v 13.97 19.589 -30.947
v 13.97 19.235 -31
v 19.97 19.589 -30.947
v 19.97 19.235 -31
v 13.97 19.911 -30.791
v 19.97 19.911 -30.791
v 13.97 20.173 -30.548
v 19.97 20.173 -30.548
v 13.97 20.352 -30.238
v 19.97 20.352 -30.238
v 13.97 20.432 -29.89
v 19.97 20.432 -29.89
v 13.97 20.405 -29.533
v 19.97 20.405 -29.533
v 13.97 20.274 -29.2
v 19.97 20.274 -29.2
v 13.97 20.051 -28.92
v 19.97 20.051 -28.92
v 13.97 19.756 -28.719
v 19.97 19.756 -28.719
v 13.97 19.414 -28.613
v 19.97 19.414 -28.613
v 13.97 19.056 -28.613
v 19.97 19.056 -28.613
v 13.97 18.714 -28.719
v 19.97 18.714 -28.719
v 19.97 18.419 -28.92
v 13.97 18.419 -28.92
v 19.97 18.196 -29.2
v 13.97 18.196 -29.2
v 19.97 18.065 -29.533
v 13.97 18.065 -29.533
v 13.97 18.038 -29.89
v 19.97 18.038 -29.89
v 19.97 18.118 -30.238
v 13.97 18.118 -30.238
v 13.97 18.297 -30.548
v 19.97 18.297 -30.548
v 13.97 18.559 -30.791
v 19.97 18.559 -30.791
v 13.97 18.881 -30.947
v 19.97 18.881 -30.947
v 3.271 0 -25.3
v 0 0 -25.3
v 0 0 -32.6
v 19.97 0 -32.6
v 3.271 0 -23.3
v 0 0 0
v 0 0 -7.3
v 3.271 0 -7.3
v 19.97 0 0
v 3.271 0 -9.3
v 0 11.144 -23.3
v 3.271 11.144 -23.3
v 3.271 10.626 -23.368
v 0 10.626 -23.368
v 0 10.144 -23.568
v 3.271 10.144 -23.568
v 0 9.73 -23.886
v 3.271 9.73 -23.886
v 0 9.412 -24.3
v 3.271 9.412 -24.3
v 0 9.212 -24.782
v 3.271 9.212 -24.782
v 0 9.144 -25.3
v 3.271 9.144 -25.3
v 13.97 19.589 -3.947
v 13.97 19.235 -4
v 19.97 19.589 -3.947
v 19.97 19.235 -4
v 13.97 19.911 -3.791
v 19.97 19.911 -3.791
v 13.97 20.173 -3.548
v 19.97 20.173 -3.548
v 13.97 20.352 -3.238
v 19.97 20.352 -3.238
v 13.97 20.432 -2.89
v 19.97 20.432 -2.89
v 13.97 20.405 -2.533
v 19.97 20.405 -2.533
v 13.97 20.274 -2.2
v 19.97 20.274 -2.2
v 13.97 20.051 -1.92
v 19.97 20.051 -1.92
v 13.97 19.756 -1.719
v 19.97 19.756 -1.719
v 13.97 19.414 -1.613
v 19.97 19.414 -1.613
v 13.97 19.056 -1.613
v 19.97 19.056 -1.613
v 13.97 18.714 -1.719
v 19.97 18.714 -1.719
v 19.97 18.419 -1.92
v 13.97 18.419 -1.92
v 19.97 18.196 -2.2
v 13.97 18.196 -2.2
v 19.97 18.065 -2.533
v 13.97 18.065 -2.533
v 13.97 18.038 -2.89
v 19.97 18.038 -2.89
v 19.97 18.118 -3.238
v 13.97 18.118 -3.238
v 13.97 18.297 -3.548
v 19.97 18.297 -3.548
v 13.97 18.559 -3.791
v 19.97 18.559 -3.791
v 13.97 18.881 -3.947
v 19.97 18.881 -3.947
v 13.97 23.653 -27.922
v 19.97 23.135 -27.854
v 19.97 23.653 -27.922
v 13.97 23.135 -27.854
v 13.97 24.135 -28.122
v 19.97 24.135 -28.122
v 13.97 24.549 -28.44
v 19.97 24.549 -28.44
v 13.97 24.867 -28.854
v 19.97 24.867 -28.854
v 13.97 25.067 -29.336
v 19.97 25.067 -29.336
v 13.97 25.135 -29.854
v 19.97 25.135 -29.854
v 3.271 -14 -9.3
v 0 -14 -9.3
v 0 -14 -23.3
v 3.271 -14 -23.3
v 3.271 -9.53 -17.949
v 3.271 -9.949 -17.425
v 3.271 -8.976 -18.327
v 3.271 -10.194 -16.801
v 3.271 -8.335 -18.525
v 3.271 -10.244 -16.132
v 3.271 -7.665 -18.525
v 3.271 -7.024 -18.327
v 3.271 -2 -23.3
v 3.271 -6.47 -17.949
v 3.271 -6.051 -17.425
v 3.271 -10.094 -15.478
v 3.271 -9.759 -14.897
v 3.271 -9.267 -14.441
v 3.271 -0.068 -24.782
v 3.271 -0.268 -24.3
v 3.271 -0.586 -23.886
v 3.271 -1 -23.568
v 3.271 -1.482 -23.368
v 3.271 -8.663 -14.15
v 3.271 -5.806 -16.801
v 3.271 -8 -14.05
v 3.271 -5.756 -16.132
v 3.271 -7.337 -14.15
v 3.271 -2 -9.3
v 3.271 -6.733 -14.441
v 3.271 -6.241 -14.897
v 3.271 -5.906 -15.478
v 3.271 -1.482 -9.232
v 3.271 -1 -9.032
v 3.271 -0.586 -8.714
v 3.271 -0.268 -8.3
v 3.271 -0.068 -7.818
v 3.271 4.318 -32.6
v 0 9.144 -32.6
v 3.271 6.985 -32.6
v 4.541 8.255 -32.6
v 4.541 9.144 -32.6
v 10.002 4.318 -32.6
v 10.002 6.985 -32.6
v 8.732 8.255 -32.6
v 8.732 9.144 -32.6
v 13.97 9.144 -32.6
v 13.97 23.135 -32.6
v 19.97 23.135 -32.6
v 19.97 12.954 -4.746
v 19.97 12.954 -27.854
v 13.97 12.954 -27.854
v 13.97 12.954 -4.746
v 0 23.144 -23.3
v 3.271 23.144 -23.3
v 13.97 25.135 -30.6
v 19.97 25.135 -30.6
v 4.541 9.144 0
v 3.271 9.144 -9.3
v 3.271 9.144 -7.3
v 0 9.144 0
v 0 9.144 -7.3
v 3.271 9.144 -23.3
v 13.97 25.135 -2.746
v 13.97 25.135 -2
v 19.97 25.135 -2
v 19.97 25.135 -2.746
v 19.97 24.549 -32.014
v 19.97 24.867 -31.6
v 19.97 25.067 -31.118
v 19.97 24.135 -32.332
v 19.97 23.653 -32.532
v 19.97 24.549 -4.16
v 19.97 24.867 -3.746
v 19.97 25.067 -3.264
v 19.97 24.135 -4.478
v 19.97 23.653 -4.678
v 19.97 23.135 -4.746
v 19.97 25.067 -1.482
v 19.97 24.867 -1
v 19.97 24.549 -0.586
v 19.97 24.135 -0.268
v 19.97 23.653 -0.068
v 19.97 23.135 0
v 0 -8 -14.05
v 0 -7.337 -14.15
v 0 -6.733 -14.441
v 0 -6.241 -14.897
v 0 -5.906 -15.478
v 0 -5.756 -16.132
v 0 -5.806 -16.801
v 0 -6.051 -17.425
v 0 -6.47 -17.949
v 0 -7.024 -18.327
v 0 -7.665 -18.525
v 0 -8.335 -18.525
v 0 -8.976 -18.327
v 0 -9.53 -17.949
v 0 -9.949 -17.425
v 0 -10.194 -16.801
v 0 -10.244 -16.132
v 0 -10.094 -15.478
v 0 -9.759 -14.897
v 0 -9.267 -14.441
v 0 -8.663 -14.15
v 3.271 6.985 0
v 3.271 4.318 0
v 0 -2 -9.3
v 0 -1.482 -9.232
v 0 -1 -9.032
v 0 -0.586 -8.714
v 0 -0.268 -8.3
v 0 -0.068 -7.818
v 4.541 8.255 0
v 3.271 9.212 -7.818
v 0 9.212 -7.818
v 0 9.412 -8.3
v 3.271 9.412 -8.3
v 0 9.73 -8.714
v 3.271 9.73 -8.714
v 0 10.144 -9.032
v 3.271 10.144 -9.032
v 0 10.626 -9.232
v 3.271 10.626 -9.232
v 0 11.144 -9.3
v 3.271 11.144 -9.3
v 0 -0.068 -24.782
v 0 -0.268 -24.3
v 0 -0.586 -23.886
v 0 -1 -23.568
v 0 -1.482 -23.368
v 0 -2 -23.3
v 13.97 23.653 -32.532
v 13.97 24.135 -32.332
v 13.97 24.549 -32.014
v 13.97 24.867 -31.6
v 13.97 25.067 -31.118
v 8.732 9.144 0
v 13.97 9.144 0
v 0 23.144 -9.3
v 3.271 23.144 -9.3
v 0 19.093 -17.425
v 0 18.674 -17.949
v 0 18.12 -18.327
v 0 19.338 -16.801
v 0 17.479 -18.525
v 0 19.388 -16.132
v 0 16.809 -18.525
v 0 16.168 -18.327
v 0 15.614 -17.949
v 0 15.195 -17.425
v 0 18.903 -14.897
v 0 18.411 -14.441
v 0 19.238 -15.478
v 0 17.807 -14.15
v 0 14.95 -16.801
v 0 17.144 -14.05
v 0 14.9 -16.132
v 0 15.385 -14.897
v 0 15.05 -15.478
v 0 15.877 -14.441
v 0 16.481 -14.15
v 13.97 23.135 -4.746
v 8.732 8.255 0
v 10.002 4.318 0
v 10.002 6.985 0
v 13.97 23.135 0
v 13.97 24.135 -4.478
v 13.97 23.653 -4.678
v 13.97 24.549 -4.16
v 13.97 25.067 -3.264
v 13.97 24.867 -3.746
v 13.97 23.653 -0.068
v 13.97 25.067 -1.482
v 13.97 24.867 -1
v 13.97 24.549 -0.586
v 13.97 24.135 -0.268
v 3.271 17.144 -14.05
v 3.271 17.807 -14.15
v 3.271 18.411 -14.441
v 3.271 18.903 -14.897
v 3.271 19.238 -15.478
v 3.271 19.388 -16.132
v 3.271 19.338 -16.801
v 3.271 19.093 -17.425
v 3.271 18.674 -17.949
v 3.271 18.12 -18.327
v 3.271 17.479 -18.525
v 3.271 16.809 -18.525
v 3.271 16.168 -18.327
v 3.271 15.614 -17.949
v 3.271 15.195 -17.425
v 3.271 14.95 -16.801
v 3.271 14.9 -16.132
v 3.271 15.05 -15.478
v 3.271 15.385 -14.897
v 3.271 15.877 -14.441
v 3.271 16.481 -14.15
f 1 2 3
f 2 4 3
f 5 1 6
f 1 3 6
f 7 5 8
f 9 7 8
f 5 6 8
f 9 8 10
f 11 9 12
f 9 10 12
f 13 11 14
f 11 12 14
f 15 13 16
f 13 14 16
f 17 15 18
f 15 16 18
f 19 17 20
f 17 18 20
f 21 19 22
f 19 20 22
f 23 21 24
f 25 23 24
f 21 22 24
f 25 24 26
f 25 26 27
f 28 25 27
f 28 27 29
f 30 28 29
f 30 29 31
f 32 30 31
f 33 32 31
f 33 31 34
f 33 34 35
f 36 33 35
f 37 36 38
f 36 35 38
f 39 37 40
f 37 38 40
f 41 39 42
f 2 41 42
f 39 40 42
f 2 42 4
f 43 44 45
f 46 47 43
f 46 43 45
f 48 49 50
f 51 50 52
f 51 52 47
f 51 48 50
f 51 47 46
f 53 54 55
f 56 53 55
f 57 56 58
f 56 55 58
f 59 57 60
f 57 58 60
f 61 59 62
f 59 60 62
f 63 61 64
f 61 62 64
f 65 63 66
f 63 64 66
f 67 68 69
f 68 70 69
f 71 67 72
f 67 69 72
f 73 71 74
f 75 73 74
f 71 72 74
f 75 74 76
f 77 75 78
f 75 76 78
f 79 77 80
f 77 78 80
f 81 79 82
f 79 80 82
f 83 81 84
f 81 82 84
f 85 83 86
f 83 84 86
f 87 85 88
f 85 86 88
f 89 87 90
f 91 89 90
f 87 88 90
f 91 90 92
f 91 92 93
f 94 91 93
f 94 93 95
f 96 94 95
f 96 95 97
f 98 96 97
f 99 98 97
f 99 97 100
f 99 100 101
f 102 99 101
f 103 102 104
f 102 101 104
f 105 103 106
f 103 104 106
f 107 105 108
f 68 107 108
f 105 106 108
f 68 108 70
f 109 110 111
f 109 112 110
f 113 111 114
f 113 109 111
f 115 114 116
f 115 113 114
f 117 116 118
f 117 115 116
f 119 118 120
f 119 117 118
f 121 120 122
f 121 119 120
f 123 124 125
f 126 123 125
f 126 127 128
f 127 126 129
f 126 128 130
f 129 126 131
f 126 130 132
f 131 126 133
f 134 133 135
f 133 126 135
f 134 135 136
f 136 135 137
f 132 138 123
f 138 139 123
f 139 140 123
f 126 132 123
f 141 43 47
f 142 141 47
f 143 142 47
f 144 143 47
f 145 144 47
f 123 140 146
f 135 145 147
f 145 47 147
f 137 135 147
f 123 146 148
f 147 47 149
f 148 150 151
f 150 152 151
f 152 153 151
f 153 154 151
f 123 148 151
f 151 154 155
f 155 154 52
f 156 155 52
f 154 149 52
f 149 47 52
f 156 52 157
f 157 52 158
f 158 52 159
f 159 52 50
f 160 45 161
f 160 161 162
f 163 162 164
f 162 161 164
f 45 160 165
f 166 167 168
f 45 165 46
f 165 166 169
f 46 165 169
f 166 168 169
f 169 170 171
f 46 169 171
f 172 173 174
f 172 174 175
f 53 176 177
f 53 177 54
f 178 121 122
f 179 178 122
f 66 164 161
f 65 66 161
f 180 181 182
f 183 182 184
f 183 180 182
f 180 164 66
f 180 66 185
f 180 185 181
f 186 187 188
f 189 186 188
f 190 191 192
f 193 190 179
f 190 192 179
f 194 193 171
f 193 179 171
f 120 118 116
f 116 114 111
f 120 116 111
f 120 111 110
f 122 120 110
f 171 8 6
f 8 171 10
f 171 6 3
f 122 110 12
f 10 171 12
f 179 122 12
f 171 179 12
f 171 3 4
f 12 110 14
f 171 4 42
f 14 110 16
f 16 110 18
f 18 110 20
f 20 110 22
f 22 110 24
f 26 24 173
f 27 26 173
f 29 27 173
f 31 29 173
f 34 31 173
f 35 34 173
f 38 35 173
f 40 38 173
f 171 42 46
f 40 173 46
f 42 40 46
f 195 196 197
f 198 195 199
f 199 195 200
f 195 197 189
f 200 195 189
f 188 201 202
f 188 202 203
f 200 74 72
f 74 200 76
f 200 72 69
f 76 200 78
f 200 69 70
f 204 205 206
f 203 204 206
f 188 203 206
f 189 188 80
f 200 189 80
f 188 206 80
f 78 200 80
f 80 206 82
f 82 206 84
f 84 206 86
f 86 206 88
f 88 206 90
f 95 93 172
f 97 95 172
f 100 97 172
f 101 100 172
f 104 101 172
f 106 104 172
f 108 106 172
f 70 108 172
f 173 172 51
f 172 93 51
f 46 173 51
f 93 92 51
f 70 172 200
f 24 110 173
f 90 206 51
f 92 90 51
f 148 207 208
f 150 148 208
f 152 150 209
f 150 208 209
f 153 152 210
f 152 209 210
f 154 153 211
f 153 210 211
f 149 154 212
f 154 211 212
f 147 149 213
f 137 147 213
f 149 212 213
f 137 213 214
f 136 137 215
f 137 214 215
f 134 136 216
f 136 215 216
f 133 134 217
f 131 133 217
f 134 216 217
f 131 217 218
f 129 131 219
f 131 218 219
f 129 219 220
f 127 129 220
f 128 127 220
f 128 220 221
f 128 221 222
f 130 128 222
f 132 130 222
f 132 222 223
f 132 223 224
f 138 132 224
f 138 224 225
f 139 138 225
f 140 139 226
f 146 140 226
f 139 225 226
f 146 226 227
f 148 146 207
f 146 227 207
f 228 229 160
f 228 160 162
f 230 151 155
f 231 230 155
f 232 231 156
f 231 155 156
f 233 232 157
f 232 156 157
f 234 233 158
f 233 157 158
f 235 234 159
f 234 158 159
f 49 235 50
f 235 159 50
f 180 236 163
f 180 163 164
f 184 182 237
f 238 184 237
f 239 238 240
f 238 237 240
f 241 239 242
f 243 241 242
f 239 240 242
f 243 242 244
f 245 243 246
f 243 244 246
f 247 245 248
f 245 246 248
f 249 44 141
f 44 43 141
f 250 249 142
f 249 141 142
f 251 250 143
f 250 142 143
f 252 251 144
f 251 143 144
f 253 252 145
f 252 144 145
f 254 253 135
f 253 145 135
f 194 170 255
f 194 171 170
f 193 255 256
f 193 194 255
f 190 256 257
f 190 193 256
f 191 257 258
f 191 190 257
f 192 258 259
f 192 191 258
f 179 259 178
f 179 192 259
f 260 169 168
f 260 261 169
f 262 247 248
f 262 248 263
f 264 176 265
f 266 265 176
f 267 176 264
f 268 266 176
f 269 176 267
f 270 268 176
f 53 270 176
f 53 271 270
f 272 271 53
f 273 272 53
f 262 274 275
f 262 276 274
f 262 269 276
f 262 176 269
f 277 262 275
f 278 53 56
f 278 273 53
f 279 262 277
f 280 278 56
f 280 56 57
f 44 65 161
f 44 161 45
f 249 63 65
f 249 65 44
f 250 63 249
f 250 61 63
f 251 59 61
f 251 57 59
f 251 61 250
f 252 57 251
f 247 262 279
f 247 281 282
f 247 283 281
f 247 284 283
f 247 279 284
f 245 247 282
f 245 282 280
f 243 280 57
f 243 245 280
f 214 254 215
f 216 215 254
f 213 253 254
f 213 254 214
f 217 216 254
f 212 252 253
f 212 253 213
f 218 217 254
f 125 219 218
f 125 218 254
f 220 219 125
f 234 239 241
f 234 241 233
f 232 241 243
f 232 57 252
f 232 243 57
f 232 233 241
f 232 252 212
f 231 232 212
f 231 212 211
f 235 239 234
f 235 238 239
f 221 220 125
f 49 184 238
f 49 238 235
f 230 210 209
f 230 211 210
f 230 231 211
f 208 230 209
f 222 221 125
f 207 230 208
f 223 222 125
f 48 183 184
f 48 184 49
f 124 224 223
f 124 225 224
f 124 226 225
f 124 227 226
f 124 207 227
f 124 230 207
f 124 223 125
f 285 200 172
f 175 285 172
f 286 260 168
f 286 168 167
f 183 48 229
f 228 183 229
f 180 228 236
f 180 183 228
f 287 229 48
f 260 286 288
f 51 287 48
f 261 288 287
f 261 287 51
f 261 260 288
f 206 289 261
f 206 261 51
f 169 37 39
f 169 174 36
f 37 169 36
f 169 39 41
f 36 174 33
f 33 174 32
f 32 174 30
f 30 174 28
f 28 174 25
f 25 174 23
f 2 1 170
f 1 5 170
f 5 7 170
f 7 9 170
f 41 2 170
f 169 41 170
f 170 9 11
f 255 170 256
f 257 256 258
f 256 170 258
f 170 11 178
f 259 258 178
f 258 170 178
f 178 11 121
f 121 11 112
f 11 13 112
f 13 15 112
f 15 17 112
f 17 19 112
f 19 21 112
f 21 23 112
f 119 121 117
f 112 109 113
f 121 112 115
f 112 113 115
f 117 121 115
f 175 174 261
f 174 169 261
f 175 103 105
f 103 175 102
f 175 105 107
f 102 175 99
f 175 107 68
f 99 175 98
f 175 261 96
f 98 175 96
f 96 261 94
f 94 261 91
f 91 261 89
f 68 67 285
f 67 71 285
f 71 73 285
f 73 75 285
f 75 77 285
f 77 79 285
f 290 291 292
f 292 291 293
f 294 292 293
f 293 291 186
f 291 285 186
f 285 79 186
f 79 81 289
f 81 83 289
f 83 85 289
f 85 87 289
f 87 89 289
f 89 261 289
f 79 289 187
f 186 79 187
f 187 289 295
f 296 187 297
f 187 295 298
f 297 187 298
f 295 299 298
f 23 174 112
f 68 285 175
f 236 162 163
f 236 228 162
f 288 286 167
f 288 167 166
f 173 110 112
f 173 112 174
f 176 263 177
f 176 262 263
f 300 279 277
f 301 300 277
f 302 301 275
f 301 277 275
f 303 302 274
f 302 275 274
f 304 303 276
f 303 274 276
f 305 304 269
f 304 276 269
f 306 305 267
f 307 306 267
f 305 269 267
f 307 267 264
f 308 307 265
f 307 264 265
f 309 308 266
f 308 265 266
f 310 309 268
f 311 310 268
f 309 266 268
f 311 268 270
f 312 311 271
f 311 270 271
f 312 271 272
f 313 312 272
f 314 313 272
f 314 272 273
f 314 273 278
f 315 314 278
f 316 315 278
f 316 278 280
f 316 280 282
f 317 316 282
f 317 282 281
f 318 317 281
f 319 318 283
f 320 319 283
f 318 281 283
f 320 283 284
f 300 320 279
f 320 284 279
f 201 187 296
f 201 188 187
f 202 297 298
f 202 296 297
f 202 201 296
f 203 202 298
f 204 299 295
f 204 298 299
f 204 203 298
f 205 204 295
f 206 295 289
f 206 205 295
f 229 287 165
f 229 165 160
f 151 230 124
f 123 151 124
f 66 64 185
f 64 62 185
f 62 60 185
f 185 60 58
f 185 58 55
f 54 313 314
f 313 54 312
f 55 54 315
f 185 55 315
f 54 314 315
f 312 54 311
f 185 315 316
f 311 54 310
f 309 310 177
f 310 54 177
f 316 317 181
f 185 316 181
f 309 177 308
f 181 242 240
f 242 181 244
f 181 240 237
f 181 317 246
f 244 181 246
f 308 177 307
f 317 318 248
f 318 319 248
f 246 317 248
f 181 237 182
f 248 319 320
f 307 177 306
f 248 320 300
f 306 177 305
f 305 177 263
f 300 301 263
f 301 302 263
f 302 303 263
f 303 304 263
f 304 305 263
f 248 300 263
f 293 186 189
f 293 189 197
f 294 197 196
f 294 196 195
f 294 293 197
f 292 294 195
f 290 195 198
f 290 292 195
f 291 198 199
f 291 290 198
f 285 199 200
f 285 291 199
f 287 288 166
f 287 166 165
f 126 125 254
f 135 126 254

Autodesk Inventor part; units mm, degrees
ref_plane "YZ Plane" through (0, 0, 0) normal (1, 0, 0) x (0, 1, 0)
ref_plane "XZ Plane" through (0, 0, 0) normal (0, 1, 0) x (-1, 0, 0)
ref_plane "XY Plane" through (0, 0, 0) normal (0, 0, 1) x (1, 0, 0)
sketch "Náčrt1" plane through (0, 0, 0) normal (0, 0, 1) x (1, 0, 0)
  line L0 (13.97, 23.865) -> (13.97, 9.144)
  line L1 (0, 9.144) -> (0, 0)
  line L2 (4.5409, 9.144) -> (0, 9.144)
  line L3 (4.5409, 8.255) -> (4.5409, 9.144)
  line L4 (3.2709, 6.985) -> (4.5409, 8.255)
  line L5 (3.2709, 4.318) -> (3.2709, 6.985)
  line L6 (8.7319, 9.144) -> (8.7319, 8.255)
  line L7 (13.97, 9.144) -> (8.7319, 9.144)
  line L8 (8.7319, 8.255) -> (10.0019, 6.985)
  line L9 (10.0019, 6.985) -> (10.0019, 4.318)
  line L10 (10.0019, 4.318) -> (3.2709, 4.318)
  line L11 (0, 0) -> (19.97, 0)
  line L12 (13.97, 22.5956) -> (13.97, 25.1349)
  line L13 (13.97, 20.4353) -> (13.97, 18.035)
  line L14 (13.97, 25.1349) -> (19.97, 25.1349)
  line L15 (19.97, 25.1349) -> (19.97, 0)
extrude "Vysunutí1" add sketch "Náčrt1" against normal blind 32.6
sketch "Náčrt2" plane through (19.97, 0, 0) normal (1, 0, 0) x (0, 0, -1)
  line L0 (0, 25.1349) -> (32.6, 25.1349) projected
  line L1 (16.3, 25.1349) -> (4.746, 25.1349)
  line L2 (4.746, 25.1349) -> (4.746, 12.9539)
  line L3 (16.3, 25.1349) -> (27.854, 25.1349)
  line L4 (27.854, 25.1349) -> (27.854, 12.9539)
  line L5 (27.854, 12.9539) -> (4.746, 12.9539)
  circle A0 centre (2.8, 19.2349) radius 1.2
  line L6 (16.3, 25.1349) -> (16.3, 15.9225)
  circle A1 centre (29.8, 19.2349) radius 1.2
  point P0 (0, 0)
  point P1 (4.746, 19.0444)
  dimension "d2" = 11.554
  dimension "d3" = 12.181
  dimension "d4" = 11.554
  dimension "d7" = 2.4
  dimension "d8" = 5.9
  dimension "d9" = 1.946
extrude "Vysunutí2" cut sketch "Náčrt2" against normal blind 32.6 contours L0 L4 L5 L2
extrude "Vysunutí3" cut sketch "Náčrt2" against normal blind 32.6 contours A0 | A1
fillet "Zaoblení1" radius 2 4 edges at (16.97, 25.1349, 0) (16.97, 25.1349, -4.746) (16.97, 25.1349, -27.854) (16.97, 25.1349, -32.6)
sketch "Náčrt3" plane through (0, 0, 0) normal (0, -1, 0) x (1, 0, 0)
  point P0 (0, 0)
sketch "Náčrt8" plane through (0, 0, 0) normal (-1, 0, 0) x (0, 0, 1)
  line L0 (0, 9.144) -> (-32.6, 9.144) projected
  line L1 (0, 0) -> (-32.6, 0) projected
  circle A0 centre (-16.3, 17.144) radius 2.25
  line L2 (-23.3, 9.144) -> (-9.3, 9.144)
  line L3 (-9.3, 9.144) -> (-9.3, 23.144)
  line L4 (-9.3, 23.144) -> (-23.3, 23.144)
  line L5 (-23.3, 23.144) -> (-23.3, 9.144)
  line L6 (0, 9.144) -> (0, 0) projected
  line L7 (0, 9.144) -> (0, 0)
  line L8 (0, 4.572) -> (9.3918, 4.572)
  circle A1 centre (-16.3, -8) radius 2.25
  line L9 (-23.3, 0) -> (-9.3, 0)
  line L10 (-9.3, 0) -> (-9.3, -14)
  line L11 (-9.3, -14) -> (-23.3, -14)
  line L12 (-23.3, -14) -> (-23.3, 0)
  point P0 (-16.3, 9.144)
  point P1 (-16.3, 9.144)
  point P2 (-16.3, 0)
  point P3 (-16.3, 0)
  dimension "d35" = 4.5
  dimension "d36" = 8
  dimension "k" = 14
  dimension "d42" = 14
  dimension "d43" = 7
  dimension "d44" = 7
extrude "Vysunutí7" add sketch "Náčrt8" against normal up to surface (3.2709 mm away)
fillet "Zaoblení2" radius 2 4 edges at (1.6355, 9.144, -9.3) (1.6355, 0, -9.3) (1.6355, 9.144, -23.3) (1.6355, 0, -23.3)
equation "\"d43\" = 0.5 * k"
equation "\"d44\" = 0.5 * k"
properties part number "Motor_holder_double" material "Měď"
